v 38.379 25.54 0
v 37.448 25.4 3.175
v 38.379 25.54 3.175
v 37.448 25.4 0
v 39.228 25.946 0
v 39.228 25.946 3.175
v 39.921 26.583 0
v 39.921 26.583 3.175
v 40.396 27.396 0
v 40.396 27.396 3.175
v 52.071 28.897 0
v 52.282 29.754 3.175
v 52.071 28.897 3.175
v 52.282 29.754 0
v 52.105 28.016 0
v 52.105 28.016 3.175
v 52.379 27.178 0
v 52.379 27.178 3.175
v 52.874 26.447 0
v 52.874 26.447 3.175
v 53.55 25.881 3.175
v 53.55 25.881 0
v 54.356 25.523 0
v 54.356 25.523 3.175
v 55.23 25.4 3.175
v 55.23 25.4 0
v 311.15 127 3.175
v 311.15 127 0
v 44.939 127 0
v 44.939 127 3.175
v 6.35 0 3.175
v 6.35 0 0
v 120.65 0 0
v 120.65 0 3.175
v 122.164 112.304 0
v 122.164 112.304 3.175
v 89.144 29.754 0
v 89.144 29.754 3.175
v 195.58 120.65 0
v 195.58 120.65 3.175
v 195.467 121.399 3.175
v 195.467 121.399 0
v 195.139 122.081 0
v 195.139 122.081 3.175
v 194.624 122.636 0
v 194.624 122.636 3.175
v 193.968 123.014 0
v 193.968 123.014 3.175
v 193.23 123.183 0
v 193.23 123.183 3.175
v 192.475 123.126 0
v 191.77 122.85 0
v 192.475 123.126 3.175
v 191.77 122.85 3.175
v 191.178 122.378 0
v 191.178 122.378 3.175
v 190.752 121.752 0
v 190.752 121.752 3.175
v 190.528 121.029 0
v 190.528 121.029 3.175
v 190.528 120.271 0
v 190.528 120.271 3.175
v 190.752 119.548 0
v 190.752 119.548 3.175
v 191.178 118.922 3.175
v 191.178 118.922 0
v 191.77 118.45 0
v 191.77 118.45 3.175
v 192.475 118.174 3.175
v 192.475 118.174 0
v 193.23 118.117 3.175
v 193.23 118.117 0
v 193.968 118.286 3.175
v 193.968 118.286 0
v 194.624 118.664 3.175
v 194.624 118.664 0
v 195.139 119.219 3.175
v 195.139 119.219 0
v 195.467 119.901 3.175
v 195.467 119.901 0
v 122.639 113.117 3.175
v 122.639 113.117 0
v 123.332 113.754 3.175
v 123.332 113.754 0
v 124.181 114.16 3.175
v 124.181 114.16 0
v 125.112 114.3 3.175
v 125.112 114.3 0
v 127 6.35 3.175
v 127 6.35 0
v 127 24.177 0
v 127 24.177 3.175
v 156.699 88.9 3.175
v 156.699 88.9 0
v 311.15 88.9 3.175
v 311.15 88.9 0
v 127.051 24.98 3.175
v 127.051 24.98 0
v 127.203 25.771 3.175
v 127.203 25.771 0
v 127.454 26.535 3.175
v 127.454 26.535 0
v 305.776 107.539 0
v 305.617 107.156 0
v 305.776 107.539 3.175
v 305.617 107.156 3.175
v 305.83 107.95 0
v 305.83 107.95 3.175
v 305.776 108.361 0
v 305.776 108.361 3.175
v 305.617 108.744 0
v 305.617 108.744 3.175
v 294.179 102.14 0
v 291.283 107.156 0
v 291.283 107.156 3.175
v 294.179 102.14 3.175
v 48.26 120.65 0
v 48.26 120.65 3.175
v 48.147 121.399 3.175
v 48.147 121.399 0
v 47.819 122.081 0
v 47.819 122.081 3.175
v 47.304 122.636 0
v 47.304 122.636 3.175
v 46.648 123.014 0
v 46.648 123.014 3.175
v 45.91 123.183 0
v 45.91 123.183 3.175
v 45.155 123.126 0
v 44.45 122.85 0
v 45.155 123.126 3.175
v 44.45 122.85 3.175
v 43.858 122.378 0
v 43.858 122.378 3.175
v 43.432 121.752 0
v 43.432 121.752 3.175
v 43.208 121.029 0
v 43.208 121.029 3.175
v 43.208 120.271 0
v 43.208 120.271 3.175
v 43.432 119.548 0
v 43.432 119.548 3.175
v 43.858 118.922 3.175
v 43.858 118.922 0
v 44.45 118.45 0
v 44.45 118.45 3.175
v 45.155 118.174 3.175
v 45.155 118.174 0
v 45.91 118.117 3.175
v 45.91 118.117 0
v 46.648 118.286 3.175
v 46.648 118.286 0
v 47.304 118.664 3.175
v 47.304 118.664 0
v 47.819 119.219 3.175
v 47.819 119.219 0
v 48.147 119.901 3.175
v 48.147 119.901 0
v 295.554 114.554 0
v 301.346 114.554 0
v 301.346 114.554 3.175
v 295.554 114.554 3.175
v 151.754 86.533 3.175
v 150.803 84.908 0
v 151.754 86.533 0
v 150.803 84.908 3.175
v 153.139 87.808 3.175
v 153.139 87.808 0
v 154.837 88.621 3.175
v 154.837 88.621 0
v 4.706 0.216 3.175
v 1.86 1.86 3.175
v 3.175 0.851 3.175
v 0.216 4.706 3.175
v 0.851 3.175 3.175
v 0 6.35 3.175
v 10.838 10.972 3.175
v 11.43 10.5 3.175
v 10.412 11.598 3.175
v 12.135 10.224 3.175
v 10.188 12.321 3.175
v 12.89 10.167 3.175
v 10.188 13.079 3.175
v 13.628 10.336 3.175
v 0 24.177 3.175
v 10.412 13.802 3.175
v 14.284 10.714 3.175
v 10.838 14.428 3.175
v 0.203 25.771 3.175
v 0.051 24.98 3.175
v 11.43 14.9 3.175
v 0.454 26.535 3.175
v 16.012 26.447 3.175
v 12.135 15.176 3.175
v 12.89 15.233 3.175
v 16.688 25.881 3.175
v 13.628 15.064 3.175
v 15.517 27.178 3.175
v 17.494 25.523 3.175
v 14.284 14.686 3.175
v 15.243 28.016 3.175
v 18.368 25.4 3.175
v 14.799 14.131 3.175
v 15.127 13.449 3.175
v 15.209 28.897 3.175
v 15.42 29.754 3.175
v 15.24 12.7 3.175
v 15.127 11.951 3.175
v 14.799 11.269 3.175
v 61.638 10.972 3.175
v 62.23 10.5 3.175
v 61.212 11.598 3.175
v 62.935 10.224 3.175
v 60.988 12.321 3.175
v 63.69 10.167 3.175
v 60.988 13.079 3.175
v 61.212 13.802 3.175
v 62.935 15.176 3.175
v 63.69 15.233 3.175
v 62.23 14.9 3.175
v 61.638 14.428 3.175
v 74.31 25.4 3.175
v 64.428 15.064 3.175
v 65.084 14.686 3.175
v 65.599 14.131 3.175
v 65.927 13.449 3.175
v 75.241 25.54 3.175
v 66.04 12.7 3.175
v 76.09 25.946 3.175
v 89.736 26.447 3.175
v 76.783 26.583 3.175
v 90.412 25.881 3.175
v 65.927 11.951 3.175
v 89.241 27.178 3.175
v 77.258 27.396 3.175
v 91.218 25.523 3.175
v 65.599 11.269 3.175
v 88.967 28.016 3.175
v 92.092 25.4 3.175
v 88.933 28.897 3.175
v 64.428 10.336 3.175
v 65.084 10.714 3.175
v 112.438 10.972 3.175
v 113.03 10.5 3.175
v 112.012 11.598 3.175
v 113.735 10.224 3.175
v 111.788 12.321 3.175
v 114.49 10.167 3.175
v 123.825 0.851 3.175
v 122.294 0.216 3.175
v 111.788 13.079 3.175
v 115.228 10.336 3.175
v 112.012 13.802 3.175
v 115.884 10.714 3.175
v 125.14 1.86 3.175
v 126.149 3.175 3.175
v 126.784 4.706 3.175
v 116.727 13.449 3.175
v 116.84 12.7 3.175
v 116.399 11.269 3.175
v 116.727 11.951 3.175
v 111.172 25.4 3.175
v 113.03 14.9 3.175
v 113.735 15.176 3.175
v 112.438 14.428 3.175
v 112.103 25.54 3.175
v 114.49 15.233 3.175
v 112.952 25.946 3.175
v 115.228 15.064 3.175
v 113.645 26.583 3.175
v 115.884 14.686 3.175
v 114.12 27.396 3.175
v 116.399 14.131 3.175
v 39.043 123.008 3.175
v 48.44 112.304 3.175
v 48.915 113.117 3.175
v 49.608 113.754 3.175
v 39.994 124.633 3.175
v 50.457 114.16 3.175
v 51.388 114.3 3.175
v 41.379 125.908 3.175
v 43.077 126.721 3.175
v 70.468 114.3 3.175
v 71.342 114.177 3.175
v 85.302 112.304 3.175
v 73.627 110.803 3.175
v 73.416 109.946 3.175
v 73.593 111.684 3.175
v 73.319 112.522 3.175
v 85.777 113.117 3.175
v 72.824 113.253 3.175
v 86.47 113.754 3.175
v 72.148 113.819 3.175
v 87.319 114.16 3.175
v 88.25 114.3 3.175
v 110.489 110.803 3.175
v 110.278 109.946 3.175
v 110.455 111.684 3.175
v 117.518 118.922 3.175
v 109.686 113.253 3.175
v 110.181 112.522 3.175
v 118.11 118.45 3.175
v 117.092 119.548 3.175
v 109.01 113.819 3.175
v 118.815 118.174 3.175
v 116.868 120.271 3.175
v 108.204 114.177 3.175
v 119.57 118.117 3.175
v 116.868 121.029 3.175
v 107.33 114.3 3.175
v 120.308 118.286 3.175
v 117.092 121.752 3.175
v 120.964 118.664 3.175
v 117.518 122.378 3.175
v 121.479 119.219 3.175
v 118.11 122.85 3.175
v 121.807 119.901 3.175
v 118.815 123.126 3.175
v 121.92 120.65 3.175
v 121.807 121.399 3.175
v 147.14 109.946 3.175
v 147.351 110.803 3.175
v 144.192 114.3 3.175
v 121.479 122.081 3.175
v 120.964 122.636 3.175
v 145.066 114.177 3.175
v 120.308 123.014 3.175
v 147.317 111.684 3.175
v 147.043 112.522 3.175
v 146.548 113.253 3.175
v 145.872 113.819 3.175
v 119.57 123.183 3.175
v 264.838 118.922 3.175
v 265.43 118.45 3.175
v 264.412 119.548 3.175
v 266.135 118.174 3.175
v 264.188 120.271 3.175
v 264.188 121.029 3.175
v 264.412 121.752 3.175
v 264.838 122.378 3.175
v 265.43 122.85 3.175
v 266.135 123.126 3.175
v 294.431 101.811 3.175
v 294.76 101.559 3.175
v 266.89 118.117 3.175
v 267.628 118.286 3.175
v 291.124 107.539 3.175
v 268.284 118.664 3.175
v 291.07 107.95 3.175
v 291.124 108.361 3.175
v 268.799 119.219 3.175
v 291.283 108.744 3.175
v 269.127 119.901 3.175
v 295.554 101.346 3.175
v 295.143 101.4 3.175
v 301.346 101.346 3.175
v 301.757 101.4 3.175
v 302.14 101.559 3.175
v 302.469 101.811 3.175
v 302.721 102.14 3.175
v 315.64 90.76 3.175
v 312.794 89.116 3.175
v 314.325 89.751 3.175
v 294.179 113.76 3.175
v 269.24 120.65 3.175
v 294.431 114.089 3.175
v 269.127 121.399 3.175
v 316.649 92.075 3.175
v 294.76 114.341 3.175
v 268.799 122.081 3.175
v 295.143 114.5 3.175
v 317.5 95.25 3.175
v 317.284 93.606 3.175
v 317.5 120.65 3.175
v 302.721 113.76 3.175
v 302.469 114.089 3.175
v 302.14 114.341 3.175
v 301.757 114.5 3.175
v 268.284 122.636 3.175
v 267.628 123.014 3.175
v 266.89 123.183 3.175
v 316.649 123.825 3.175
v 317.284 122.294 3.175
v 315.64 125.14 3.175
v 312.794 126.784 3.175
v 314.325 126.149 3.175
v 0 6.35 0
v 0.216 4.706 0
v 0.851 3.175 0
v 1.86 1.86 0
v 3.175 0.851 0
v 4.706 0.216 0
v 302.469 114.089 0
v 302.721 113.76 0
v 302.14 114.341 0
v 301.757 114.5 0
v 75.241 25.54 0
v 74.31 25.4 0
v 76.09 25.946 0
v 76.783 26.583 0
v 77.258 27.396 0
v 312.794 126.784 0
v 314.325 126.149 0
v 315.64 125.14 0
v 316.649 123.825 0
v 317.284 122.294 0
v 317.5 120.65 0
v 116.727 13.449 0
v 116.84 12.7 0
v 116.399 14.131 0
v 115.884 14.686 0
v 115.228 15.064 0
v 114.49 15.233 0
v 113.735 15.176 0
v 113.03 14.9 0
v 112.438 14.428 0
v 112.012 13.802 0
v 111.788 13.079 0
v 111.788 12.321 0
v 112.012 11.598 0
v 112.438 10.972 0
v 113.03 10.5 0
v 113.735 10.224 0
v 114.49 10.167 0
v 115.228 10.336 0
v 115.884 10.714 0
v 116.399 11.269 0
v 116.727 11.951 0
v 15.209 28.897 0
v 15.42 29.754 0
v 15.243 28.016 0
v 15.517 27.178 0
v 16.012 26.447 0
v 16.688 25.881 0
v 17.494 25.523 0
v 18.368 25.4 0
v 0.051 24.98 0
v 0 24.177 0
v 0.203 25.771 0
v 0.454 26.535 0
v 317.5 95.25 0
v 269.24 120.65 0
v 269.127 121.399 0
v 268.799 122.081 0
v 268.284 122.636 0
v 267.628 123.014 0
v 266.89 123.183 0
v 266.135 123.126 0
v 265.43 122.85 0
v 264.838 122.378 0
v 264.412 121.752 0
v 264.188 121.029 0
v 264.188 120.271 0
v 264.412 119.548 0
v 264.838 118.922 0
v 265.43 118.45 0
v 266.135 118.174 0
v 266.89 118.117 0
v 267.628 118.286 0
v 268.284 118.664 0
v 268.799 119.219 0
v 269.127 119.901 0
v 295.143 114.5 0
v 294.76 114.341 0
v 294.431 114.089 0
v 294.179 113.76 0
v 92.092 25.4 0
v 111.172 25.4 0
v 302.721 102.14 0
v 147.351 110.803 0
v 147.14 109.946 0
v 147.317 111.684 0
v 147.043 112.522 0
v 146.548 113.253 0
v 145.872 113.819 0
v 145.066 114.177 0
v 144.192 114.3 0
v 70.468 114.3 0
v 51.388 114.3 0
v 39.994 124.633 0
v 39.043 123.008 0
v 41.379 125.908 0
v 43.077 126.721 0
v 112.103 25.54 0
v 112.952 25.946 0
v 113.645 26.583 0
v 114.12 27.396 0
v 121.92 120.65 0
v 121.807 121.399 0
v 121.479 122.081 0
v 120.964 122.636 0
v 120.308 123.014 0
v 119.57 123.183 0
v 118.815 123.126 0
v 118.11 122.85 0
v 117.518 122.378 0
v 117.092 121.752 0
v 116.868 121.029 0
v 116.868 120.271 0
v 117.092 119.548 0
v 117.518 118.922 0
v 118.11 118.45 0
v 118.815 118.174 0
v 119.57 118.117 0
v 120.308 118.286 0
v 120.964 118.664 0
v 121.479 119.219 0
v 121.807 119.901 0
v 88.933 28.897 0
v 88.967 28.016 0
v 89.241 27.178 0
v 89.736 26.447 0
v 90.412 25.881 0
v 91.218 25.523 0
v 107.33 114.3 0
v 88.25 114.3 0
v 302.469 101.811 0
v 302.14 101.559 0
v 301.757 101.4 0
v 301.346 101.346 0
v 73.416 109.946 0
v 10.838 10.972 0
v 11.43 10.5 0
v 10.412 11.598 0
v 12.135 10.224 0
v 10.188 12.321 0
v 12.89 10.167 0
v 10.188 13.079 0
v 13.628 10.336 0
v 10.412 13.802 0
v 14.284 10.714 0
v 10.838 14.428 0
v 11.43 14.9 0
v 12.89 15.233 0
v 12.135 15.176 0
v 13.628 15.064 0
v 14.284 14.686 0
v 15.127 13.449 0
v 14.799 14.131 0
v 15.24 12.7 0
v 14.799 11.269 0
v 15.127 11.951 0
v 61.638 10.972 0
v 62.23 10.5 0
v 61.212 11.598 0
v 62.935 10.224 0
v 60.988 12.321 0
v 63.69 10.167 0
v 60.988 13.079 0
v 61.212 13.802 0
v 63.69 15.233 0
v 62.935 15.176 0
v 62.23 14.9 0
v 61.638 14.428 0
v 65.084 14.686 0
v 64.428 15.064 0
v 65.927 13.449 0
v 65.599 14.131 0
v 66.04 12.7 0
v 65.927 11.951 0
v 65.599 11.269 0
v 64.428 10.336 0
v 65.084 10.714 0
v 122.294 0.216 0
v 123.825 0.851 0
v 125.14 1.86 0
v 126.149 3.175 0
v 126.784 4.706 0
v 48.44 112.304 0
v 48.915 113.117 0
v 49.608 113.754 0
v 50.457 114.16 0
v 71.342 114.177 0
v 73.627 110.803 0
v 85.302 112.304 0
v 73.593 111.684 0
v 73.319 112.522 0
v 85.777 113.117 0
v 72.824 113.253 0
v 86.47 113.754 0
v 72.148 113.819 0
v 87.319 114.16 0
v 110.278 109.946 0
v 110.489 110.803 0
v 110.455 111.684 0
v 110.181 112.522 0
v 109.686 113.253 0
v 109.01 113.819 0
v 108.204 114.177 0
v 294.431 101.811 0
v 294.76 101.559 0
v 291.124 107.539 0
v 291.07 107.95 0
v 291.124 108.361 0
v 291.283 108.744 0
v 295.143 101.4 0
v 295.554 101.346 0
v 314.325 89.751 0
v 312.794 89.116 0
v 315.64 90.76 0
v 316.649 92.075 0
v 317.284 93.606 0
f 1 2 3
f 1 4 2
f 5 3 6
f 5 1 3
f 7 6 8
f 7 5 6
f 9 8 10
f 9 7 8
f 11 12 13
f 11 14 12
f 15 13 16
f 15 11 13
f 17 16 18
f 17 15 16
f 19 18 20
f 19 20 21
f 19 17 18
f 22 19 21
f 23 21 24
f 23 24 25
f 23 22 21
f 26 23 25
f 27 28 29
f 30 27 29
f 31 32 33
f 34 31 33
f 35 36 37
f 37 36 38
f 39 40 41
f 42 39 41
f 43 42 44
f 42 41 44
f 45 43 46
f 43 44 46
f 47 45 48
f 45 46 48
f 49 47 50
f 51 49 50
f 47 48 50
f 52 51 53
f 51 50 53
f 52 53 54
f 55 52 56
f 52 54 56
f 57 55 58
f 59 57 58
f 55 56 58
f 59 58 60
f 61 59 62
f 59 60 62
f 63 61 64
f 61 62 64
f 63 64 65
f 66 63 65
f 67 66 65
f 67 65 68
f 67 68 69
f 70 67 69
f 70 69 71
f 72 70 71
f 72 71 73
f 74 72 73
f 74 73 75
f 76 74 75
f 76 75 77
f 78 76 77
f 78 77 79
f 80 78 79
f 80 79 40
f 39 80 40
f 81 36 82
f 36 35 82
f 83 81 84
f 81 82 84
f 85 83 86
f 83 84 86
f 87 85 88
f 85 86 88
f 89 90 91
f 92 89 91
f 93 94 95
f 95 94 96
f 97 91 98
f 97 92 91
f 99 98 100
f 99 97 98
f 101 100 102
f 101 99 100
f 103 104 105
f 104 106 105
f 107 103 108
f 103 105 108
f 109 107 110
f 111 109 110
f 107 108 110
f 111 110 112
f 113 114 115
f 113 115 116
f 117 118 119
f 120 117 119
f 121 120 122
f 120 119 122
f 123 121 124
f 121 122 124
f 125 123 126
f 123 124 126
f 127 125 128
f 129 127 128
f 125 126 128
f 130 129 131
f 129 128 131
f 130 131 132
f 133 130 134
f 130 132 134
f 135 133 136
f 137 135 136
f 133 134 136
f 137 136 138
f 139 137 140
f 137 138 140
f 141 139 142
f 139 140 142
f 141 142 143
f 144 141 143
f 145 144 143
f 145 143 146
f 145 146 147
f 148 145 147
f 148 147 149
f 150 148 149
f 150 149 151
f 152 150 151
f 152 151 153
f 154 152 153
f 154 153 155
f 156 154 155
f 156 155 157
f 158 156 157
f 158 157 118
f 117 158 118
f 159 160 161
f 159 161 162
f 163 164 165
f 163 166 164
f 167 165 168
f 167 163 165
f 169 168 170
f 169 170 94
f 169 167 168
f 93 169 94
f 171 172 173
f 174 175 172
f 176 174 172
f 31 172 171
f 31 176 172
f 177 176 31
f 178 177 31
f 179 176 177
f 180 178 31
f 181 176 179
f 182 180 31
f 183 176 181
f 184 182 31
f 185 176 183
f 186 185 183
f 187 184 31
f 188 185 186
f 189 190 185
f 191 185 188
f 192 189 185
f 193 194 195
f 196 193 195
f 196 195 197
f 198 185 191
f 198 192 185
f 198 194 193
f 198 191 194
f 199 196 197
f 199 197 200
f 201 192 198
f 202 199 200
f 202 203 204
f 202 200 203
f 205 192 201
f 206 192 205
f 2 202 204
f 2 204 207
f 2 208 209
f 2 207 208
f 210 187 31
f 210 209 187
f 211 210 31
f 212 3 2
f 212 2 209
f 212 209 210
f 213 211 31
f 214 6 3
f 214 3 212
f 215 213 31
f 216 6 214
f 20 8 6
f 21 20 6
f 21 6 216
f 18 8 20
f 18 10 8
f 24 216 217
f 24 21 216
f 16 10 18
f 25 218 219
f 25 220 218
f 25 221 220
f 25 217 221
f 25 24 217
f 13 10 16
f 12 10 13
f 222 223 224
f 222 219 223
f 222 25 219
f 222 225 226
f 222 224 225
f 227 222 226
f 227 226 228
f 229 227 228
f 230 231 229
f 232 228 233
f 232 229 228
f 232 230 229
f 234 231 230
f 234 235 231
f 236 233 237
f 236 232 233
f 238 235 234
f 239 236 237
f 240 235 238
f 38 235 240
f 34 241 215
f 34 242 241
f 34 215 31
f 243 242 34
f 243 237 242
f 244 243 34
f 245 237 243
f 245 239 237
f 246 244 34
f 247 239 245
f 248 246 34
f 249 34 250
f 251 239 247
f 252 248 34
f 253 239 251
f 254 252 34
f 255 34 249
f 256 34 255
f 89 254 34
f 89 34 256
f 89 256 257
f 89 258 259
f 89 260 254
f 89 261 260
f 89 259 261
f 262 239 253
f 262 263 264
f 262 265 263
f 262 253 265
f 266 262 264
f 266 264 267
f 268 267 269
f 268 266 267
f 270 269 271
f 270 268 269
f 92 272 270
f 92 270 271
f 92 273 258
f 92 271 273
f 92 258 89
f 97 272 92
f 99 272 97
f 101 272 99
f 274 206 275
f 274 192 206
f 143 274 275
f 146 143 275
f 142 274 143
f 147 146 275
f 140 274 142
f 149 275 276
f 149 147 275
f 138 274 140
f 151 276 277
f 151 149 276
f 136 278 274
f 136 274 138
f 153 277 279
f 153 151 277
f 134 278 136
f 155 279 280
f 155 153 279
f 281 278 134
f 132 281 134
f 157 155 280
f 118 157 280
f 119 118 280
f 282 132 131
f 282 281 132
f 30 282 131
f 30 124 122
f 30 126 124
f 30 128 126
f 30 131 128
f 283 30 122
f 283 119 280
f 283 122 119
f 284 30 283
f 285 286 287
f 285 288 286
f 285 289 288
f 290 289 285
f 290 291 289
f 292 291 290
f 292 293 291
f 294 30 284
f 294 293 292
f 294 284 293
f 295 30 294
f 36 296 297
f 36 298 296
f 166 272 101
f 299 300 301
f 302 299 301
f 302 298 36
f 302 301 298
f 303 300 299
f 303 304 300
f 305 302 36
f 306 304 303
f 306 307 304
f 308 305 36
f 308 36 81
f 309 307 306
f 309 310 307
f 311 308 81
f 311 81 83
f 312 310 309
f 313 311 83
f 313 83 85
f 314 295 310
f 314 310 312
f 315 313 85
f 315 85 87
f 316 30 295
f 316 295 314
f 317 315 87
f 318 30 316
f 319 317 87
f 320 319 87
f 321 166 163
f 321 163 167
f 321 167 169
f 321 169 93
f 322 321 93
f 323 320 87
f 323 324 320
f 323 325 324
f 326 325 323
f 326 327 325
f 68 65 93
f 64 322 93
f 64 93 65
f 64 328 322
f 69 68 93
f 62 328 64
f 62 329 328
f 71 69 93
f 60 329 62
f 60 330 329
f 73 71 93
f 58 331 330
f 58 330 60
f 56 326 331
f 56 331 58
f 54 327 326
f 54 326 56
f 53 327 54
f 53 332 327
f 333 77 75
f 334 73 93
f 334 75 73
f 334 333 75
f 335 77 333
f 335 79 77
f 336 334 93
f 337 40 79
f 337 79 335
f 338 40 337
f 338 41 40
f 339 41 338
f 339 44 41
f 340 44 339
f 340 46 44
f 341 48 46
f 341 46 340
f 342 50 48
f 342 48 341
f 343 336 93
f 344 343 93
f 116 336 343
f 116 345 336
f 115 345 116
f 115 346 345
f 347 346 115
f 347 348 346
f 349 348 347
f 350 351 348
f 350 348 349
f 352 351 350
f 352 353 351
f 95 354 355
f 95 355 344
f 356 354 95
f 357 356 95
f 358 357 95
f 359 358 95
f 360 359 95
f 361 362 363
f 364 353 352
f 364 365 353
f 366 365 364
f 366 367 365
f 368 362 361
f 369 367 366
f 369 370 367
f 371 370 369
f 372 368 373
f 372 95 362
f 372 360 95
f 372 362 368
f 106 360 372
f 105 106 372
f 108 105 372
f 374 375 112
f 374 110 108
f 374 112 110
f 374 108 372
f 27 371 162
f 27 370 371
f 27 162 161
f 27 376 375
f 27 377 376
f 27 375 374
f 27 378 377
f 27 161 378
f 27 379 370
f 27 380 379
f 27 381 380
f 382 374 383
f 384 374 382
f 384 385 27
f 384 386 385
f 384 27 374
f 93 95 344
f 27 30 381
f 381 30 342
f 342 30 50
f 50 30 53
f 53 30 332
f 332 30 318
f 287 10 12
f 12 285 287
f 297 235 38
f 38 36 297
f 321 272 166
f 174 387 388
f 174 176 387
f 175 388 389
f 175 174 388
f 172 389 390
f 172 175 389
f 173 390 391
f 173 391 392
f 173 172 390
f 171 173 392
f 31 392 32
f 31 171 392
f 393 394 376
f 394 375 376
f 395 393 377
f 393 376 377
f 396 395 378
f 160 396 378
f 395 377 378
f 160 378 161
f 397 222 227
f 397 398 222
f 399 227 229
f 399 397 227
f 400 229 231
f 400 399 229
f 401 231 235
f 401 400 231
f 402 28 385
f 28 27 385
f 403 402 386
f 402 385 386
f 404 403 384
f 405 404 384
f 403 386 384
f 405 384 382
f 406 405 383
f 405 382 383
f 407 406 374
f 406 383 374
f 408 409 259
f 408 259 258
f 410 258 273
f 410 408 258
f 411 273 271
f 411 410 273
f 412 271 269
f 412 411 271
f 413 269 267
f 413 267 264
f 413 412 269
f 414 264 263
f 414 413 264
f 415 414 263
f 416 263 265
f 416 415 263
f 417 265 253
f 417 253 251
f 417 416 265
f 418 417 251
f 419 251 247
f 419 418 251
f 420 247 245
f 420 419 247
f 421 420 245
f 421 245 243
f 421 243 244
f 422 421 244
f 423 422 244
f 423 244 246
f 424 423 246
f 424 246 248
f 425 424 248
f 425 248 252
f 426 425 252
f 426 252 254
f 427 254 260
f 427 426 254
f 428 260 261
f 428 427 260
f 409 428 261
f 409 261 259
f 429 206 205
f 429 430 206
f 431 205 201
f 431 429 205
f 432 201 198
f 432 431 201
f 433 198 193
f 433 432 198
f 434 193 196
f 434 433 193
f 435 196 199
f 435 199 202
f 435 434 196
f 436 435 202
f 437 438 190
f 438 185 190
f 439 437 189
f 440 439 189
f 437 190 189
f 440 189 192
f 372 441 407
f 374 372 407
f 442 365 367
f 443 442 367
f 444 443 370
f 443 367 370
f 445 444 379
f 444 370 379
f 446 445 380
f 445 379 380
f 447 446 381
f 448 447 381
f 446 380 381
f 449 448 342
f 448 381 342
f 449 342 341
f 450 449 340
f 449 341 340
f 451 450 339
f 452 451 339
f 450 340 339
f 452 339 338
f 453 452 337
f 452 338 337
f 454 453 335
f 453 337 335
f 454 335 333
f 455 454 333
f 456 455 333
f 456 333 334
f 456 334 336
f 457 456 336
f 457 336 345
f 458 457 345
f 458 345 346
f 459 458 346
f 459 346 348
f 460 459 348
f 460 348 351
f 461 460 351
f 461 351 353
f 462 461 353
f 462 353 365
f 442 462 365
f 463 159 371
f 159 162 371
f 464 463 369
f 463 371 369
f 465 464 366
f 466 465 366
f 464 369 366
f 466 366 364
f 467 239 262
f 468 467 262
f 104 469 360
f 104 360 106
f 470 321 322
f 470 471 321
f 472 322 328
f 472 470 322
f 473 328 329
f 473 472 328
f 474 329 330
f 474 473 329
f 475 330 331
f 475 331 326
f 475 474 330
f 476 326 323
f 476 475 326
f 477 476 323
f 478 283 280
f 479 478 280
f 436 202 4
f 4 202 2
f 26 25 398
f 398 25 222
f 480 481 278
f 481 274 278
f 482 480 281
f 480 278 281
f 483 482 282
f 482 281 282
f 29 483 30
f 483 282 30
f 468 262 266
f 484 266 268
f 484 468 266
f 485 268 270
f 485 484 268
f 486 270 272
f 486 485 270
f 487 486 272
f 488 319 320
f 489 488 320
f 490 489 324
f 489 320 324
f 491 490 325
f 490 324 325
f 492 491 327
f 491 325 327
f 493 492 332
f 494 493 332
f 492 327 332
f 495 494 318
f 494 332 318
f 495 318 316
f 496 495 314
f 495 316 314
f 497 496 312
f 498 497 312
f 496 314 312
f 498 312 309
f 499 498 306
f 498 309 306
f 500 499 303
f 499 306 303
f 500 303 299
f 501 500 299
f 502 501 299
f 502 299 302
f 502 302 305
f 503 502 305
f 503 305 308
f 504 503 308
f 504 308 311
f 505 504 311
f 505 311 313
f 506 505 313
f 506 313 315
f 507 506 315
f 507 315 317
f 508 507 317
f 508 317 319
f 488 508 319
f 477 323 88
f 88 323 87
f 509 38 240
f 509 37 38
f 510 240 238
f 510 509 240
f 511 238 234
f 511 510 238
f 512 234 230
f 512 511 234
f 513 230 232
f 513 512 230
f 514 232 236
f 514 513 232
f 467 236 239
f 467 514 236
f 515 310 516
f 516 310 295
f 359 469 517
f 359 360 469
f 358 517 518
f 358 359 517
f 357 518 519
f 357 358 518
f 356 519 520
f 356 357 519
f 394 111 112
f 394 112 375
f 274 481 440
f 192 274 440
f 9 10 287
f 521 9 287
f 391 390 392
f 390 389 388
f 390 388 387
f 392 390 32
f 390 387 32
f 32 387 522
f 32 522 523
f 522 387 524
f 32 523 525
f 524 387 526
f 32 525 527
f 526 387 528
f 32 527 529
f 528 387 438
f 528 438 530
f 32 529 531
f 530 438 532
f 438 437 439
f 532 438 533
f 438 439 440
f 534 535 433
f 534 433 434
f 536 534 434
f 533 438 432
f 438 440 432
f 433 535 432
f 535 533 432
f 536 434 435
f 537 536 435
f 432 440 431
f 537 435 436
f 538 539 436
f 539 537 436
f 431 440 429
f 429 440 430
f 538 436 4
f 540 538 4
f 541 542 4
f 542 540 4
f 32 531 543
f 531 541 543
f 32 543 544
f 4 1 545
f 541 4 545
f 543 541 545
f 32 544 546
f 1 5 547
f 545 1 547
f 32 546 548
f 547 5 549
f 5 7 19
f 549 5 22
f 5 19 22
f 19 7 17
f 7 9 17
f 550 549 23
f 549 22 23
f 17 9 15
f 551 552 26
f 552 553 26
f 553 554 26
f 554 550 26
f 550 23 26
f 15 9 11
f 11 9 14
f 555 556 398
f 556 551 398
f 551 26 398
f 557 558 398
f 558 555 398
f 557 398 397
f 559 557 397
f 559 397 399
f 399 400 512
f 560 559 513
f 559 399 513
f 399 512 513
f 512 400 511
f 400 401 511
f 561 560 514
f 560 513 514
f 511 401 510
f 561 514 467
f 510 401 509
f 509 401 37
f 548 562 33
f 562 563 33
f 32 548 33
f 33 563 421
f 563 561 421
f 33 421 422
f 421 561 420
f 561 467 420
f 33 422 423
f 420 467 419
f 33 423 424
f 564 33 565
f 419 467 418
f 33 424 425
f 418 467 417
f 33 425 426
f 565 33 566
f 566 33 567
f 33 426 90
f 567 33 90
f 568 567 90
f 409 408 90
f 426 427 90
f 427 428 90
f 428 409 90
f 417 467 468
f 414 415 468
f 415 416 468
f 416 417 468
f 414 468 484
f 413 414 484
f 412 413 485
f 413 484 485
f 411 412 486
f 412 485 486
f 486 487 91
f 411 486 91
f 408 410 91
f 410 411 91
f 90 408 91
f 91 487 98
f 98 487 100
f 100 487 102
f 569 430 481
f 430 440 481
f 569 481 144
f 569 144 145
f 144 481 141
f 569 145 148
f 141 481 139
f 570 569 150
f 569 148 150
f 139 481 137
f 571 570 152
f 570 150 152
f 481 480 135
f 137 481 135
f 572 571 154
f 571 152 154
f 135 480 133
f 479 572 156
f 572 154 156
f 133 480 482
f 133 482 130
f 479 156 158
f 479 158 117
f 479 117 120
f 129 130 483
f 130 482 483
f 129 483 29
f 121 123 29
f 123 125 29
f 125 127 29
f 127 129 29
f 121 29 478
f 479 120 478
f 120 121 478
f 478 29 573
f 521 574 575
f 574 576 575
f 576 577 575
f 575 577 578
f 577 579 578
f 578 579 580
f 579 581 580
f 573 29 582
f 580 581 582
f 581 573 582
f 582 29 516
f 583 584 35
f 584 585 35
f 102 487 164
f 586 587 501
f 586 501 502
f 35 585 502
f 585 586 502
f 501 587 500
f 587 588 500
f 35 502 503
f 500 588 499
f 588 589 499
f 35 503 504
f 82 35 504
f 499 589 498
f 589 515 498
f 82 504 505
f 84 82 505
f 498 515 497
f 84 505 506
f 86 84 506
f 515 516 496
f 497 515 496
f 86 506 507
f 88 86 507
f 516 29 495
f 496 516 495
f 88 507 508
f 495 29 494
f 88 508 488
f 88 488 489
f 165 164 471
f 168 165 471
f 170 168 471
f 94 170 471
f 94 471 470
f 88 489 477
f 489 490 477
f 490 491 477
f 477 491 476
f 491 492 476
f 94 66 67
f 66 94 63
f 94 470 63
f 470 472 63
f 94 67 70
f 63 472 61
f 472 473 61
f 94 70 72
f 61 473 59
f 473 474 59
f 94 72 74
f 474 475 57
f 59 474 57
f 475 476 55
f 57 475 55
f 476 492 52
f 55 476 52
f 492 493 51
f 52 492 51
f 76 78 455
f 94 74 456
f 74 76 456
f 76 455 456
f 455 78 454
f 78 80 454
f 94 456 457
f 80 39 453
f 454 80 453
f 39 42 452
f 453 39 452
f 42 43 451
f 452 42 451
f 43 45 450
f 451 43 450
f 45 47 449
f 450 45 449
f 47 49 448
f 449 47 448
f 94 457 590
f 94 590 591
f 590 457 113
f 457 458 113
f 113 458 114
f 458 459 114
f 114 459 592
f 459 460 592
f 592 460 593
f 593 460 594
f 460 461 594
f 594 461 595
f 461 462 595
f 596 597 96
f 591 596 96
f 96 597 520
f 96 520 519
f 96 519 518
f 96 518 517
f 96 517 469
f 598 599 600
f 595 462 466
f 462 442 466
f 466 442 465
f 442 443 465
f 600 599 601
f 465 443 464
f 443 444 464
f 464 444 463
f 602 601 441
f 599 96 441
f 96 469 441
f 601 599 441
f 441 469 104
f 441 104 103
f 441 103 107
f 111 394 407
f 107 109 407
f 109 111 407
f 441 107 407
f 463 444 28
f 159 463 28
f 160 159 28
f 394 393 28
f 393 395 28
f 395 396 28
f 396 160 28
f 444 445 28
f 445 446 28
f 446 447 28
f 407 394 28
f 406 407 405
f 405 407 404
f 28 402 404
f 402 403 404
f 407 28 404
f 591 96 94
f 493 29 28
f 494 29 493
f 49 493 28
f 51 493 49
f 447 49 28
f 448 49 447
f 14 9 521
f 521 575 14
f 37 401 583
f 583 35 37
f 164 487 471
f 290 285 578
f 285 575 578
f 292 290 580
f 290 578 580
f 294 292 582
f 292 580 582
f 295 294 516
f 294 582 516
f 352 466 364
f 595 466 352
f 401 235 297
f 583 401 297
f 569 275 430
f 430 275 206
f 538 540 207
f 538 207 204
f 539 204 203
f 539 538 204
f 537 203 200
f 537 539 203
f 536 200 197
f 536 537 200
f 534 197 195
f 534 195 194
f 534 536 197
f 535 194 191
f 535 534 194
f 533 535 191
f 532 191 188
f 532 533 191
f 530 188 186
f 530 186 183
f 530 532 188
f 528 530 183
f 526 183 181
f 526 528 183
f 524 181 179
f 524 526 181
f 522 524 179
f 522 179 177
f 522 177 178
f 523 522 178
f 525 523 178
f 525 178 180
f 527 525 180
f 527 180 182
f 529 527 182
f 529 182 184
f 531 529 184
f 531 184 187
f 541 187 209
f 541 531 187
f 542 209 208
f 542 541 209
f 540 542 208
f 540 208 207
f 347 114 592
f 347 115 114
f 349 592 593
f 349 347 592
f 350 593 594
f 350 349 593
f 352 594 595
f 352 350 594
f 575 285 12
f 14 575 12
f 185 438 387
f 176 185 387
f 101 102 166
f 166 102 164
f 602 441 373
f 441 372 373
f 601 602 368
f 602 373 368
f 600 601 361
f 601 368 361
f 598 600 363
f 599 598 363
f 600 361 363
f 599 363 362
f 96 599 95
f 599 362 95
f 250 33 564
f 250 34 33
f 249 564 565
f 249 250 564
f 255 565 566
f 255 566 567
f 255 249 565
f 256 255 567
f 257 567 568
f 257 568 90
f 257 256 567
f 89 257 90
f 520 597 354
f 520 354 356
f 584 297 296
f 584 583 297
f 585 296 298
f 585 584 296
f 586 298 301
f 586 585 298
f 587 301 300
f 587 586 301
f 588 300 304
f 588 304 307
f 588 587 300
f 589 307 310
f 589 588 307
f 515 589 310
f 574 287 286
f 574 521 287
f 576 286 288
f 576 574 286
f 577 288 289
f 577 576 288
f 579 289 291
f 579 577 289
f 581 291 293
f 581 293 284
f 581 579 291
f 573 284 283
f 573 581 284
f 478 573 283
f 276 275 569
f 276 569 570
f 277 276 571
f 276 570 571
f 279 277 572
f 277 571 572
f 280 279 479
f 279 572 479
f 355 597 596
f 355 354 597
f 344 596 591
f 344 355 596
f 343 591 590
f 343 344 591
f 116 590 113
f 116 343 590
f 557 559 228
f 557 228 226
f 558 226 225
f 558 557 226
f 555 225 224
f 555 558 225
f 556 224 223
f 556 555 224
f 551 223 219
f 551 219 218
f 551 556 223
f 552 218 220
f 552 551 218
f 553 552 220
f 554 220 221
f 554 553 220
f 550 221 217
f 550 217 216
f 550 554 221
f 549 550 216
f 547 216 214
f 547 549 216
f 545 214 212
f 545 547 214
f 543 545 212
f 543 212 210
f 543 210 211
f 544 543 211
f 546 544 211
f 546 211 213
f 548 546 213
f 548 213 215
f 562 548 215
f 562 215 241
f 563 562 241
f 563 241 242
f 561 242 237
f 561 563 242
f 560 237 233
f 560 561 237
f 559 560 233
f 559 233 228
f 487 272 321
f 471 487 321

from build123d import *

# Parameters (mm, degrees)
SKETCH1_R           = 2.54
BOSS_EXTRUDE1_DEPTH = 3.175
FILLET1_R           = 6.35
CUT_EXTRUDE1_DEPTH  = 342.972704503
FILLET2_R           = 3.175
SKETCH3_R           = 2.54
CUT_EXTRUDE2_DEPTH  = 342.972704503
FILLET3_R           = 1.5875


with BuildPart() as part:
    # Sketch1 → Boss-Extrude1 (new body)
    with BuildSketch(Plane.XY):
        Polygon((0, 25.4), (0, 0), (127, 0), (127, 25.4), (152.4, 88.9), (317.5, 88.9), (317.5, 127), (279.4, 127), (152.4, 127), (40.64, 127), align=None)
        with Locations((12.7, 12.7)):
            Circle(SKETCH1_R, mode=Mode.SUBTRACT)
        with Locations((63.5, 12.7)):
            Circle(SKETCH1_R, mode=Mode.SUBTRACT)
        with Locations((114.3, 12.7)):
            Circle(SKETCH1_R, mode=Mode.SUBTRACT)
        Polygon((302.262821178, 101.346), (306.075642355, 107.95), (302.262821178, 114.554), (294.637178822, 114.554), (290.824357645, 107.95), (294.637178822, 101.346), align=None, mode=Mode.SUBTRACT)
    extrude(amount=BOSS_EXTRUDE1_DEPTH)

    # Fillet1
    fillet1_edges = [part.edges().sort_by_distance(p)[0] for p in [
        (40.64, 127, 1.5875),
        (317.5, 127, 1.5875),
        (317.5, 88.9, 1.5875),
        (152.4, 88.9, 1.5875),
        (127, 25.4, 1.5875),
        (127, 0, 1.5875),
        (0, 0, 1.5875),
        (0, 25.4, 1.5875),
    ]]
    fillet(fillet1_edges, radius=FILLET1_R)

    # Sketch2 → Cut-Extrude1 (cut, through all)
    with BuildSketch(Plane.XY.offset(3.175)):
        Polygon((49.23831861, 114.3), (13.67831861, 25.4), (39.597669611, 25.4), (75.157669611, 114.3), align=None)
        Polygon((86.100324499, 114.3), (50.540324499, 25.4), (76.459675501, 25.4), (112.019675501, 114.3), align=None)
        Polygon((122.962330389, 114.3), (87.402330389, 25.4), (113.32168139, 25.4), (148.88168139, 114.3), align=None)
    extrude(amount=-CUT_EXTRUDE1_DEPTH, mode=Mode.SUBTRACT)

    # Fillet2
    fillet2_edges = [part.edges().sort_by_distance(p)[0] for p in [
        (76.459675501, 25.4, 1.5875),
        (50.540324499, 25.4, 1.5875),
        (86.100324499, 114.3, 1.5875),
        (112.019675501, 114.3, 1.5875),
        (148.88168139, 114.3, 1.5875),
        (113.32168139, 25.4, 1.5875),
        (87.402330389, 25.4, 1.5875),
        (122.962330389, 114.3, 1.5875),
        (39.597669611, 25.4, 1.5875),
        (13.67831861, 25.4, 1.5875),
        (49.23831861, 114.3, 1.5875),
        (75.157669611, 114.3, 1.5875),
    ]]
    fillet(fillet2_edges, radius=FILLET2_R)

    # Sketch3 → Cut-Extrude2 (cut, through all)
    with BuildSketch(Plane.XY.offset(3.175)):
        with Locations((45.72, 120.65)):
            Circle(SKETCH3_R)
        with Locations((119.38, 120.65)):
            Circle(SKETCH3_R)
        with Locations((193.04, 120.65)):
            Circle(SKETCH3_R)
        with Locations((266.7, 120.65)):
            Circle(SKETCH3_R)
    extrude(amount=-CUT_EXTRUDE2_DEPTH, mode=Mode.SUBTRACT)

    # Fillet3
    fillet3_edges = [part.edges().sort_by_distance(p)[0] for p in [
        (294.637178822, 101.346, 1.5875),
        (302.262821178, 101.346, 1.5875),
        (306.075642355, 107.95, 1.5875),
        (302.262821178, 114.554, 1.5875),
        (294.637178822, 114.554, 1.5875),
        (290.824357645, 107.95, 1.5875),
    ]]
    fillet(fillet3_edges, radius=FILLET3_R)


solid = part.part
